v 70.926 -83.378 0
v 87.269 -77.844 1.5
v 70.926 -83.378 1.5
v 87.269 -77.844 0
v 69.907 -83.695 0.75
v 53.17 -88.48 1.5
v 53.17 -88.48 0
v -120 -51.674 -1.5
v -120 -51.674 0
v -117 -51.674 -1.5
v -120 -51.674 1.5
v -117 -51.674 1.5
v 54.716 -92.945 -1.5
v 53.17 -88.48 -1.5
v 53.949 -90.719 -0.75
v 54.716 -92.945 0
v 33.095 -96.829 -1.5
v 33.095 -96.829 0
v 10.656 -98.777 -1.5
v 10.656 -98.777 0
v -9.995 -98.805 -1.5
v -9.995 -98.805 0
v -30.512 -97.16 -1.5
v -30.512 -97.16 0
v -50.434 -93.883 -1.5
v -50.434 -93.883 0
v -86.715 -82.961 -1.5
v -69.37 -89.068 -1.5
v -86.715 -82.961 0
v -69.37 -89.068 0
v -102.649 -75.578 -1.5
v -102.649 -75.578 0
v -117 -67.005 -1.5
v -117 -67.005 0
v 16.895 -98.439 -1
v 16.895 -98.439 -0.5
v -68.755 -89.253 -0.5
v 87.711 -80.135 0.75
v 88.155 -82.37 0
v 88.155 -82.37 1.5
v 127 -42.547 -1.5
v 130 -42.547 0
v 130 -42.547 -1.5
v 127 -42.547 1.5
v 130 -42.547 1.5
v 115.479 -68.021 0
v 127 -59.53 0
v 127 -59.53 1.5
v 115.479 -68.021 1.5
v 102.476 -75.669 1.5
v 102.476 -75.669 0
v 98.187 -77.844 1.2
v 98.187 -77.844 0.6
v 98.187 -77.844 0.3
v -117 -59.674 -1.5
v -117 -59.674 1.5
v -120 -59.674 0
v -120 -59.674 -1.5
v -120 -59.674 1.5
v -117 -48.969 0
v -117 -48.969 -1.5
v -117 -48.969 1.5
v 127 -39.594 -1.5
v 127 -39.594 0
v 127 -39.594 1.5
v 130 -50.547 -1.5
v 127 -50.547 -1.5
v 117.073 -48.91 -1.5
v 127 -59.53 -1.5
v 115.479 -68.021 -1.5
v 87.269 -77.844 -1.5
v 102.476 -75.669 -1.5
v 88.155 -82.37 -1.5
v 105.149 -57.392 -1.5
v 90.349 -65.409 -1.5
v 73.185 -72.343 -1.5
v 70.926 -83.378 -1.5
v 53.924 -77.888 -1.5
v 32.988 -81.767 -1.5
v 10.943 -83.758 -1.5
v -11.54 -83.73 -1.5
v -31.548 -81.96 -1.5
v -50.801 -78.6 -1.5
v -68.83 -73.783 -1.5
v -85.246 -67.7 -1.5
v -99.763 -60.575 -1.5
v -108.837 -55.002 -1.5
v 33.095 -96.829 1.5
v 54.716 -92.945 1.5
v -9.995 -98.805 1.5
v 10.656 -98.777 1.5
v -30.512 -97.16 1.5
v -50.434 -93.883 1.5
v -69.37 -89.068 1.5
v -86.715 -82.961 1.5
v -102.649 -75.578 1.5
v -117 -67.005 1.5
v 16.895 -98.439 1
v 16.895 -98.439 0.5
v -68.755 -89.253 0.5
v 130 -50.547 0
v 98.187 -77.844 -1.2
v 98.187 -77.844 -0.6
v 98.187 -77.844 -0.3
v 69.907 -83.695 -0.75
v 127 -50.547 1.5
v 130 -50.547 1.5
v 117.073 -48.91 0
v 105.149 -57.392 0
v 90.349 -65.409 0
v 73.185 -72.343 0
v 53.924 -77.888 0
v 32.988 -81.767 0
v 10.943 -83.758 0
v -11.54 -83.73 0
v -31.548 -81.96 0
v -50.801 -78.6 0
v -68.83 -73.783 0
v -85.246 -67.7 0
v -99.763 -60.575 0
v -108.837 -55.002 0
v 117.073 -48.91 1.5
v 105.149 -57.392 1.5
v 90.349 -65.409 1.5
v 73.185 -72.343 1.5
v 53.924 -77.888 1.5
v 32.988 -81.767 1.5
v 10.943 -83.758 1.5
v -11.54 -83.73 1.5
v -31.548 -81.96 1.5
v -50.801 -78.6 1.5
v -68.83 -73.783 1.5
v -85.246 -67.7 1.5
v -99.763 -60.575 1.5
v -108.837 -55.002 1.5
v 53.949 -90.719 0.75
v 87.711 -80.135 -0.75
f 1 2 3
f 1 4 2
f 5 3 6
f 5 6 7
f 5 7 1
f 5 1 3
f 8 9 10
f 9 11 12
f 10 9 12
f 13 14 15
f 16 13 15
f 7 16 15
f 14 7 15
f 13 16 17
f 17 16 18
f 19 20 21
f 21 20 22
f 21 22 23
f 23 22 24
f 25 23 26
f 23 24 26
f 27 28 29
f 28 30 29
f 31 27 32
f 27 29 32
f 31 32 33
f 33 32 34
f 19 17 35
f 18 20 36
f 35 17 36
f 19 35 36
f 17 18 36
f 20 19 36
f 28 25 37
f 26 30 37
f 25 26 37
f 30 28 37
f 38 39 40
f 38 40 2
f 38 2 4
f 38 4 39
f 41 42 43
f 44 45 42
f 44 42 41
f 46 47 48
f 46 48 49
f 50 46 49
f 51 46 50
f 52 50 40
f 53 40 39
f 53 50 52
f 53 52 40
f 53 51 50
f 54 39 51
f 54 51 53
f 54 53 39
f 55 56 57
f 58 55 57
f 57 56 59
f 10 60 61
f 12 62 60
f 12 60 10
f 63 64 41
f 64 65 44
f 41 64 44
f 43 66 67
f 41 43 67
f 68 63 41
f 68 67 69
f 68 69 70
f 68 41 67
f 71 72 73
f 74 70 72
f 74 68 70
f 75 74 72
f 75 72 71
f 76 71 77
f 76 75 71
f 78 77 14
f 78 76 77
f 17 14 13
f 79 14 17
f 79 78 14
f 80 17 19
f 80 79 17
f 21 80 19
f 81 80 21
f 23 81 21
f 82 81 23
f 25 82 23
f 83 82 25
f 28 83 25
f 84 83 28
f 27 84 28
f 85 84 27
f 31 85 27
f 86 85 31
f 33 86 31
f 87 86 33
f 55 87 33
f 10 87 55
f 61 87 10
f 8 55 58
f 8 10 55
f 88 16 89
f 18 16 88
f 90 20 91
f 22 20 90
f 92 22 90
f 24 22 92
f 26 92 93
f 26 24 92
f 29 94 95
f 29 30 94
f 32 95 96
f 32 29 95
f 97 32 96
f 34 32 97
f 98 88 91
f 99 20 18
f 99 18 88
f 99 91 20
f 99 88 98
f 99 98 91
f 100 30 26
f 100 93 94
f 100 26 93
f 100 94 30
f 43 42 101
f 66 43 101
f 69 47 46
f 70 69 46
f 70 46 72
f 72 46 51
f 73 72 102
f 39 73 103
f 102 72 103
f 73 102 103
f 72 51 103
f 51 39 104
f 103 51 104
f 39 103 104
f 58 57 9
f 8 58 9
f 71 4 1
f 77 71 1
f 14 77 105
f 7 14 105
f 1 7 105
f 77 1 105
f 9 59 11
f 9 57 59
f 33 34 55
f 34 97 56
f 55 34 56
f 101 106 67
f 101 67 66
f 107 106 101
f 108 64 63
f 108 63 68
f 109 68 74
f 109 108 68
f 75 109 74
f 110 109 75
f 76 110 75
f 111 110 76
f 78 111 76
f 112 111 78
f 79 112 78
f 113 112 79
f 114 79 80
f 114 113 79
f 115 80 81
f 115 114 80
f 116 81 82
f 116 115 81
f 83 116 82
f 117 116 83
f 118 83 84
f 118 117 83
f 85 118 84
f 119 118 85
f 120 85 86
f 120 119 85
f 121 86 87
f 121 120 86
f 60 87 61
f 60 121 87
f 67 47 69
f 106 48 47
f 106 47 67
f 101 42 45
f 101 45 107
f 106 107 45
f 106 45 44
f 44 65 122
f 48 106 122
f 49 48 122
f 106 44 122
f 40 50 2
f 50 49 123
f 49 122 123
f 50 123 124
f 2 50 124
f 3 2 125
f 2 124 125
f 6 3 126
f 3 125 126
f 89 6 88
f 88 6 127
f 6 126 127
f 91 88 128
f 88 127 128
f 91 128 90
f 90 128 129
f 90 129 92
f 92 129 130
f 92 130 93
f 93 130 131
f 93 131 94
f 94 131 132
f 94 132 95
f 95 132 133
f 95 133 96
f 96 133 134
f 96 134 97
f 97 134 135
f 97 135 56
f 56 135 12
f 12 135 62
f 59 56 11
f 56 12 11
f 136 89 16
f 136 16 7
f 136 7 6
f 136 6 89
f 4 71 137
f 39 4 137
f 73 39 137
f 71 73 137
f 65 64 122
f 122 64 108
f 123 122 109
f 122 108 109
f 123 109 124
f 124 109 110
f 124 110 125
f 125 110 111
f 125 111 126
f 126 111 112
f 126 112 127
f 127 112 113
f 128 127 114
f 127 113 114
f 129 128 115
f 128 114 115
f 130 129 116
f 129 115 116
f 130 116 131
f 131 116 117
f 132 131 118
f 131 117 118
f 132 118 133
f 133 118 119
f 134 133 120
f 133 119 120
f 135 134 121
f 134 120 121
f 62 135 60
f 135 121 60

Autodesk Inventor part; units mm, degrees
ref_plane "YZ Plane" through (0, 0, 0) normal (1, 0, 0) x (0, 1, 0)
ref_plane "XZ Plane" through (0, 0, 0) normal (0, 1, 0) x (-1, 0, 0)
ref_plane "XY Plane" through (0, 0, 0) normal (0, 0, 1) x (1, 0, 0)
ref_plane "Work Plane1" through (0, 0, 0) normal (0, 0, -1) x (-1, 0, 0)
sketch "Sketch1" plane through (0, 0, 0) normal (0, 0, -1) x (-1, 0, 0)
  spline S0 degree 3 poles (105.4883, 71.0587) (105.6559, 71.4694) (105.824, 71.88) (106.1569, 72.6904) (106.3216, 73.0904) (106.4867, 73.4901) knots -0.266162 -0.266162 -0.266162 -0.266162 -0.133087 -0.133087 -0.003341 -0.003341 -0.003341 -0.003341
  spline S1 degree 3 poles (106.4867, 73.4901) (99.3414, 77.5054) (91.623, 81.1106) (83.426, 84.2596) knots -25.895552 -25.895552 -25.895552 -25.895552 -23.89596 -23.89596 -23.89596 -23.89596
  spline S2 degree 3 poles (83.426, 84.2596) (83.383, 84.1862) (83.3401, 84.1127) (83.2498, 83.9584) (83.2025, 83.8776) (83.1552, 83.7967) knots -0.053633 -0.053633 -0.053633 -0.053633 -0.028107 -0.028107 0 0 0 0
  spline S3 degree 3 poles (83.1552, 83.7967) (82.995, 83.5034) (82.8346, 83.2101) (82.5137, 82.6238) (82.353, 82.3306) (82.1922, 82.0376) knots -0.200537 -0.200537 -0.200537 -0.200537 -0.100278 -0.100278 -0.000001 -0.000001 -0.000001 -0.000001
  spline S4 degree 3 poles (82.1922, 82.0376) (86.075, 80.3865) (89.9435, 78.6654) (97.7089, 75.0245) (101.6317, 73.0864) (105.4883, 71.0587) knots -2.573015 -2.573015 -2.573015 -2.573015 -1.307167 -1.307167 -0.00005 -0.00005 -0.00005 -0.00005
  spline S5 degree 3 poles (-58.9228, -91.9417) (-58.7749, -91.5277) (-58.6267, -91.1139) (-58.3286, -90.2835) (-58.1787, -89.8669) (-58.0284, -89.4505) knots -0.264733 -0.264733 -0.264733 -0.264733 -0.132868 -0.132868 -0.000055 -0.000055 -0.000055 -0.000055
  spline S6 degree 3 poles (-58.0284, -89.4505) (-62.2238, -88.2949) (-66.4105, -87.0769) (-74.8294, -84.4769) (-79.0836, -83.0842) (-83.2953, -81.6123) knots -2.643421 -2.643421 -2.643421 -2.643421 -1.338468 -1.338468 -0.000018 -0.000018 -0.000018 -0.000018
  spline S7 degree 3 poles (-83.2953, -81.6123) (-83.3681, -81.9392) (-83.4412, -82.2661) (-83.5877, -82.9196) (-83.6612, -83.2462) (-83.7349, -83.5728) knots -0.200918 -0.200918 -0.200918 -0.200918 -0.100445 -0.100445 0 0 0 0
  spline S8 degree 3 poles (-83.7349, -83.5728) (-83.7526, -83.6651) (-83.7703, -83.7574) (-83.8042, -83.9335) (-83.8204, -84.0175) (-83.8365, -84.1014) knots -0.056363 -0.056363 -0.056363 -0.056363 -0.02818 -0.02818 -0.002542 -0.002542 -0.002542 -0.002542
  spline S9 degree 3 poles (-83.8365, -84.1014) (-75.9007, -87.1708) (-67.5641, -89.7922) (-58.9228, -91.9417) knots -18.70759 -18.70759 -18.70759 -18.70759 -16.308401 -16.308401 -16.308401 -16.308401
  spline S10 degree 3 poles (-140.1561, 42.7052) (-140.5265, 42.9467) (-140.897, 43.1882) (-141.6163, 43.6575) (-141.9653, 43.8854) (-142.3142, 44.1132) knots -0.265285 -0.265285 -0.265285 -0.265285 -0.132646 -0.132646 -0.007633 -0.007633 -0.007633 -0.007633
  spline S11 degree 3 poles (-142.3142, 44.1132) (-146.1137, 39.3661) (-149.4383, 34.2577) (-152.1041, 28.8109) knots -4.827939 -4.827939 -4.827939 -4.827939 -3.006582 -3.006582 -3.006582 -3.006582
  spline S12 degree 3 poles (-152.1041, 28.8109) (-152.0643, 28.7818) (-152.0246, 28.7528) (-151.9093, 28.6685) (-151.8337, 28.6133) (-151.7582, 28.5581) knots -0.042842 -0.042842 -0.042842 -0.042842 -0.028073 -0.028073 -0.000004 -0.000004 -0.000004 -0.000004
  spline S13 degree 3 poles (-151.7582, 28.5581) (-151.4839, 28.3673) (-151.2096, 28.1764) (-150.6612, 27.7945) (-150.3869, 27.6033) (-150.1128, 27.4122) knots -0.200499 -0.200499 -0.200499 -0.200499 -0.100262 -0.100262 -0.000004 -0.000004 -0.000004 -0.000004
  spline S14 degree 3 poles (-150.1128, 27.4122) (-148.5536, 30.1288) (-146.8737, 32.8286) (-143.5422, 37.8978) (-141.8646, 40.3248) (-140.1561, 42.7052) knots -1.819993 -1.819993 -1.819993 -1.819993 -0.879034 -0.879034 -0.00001 -0.00001 -0.00001 -0.00001
  spline S15 degree 3 poles (-55.7728, -89.0282) (-55.9385, -89.4734) (-56.1038, -89.9189) (-56.4333, -90.8099) (-56.5976, -91.2556) (-56.7614, -91.7014) knots -0.285003 -0.285003 -0.285003 -0.285003 -0.142483 -0.142483 0 0 0 0
  spline S16 degree 3 poles (-56.7614, -91.7014) (-56.6983, -91.718) (-56.6352, -91.7345) (-56.509, -91.7676) (-56.4459, -91.7842) (-56.3828, -91.8007) knots -0.039143 -0.039143 -0.039143 -0.039143 -0.019569 -0.019569 0 0 0 0
  spline S17 degree 3 poles (-56.3828, -91.8007) (-56.222, -91.32) (-56.0607, -90.8394) (-55.7373, -89.8786) (-55.5752, -89.3983) (-55.4125, -88.9181) knots -0.30413 -0.30413 -0.30413 -0.30413 -0.152078 -0.152078 0 0 0 0
  spline S18 degree 3 poles (-55.4125, -88.9181) (-60.3959, -87.5747) (-65.3718, -86.1432) (-75.3762, -83.0506) (-80.443, -81.3711) (-85.4421, -79.5755) knots -3.141533 -3.141533 -3.141533 -3.141533 -1.593545 -1.593545 0 0 0 0
  spline S19 degree 3 poles (-85.4421, -79.5755) (-85.6008, -80.3472) (-85.7615, -81.1191) (-86.0831, -82.6482) (-86.2442, -83.4064) (-86.4067, -84.1638) knots -0.472496 -0.472496 -0.472496 -0.472496 -0.236135 -0.236135 -0.003733 -0.003733 -0.003733 -0.003733
  spline S20 degree 3 poles (-86.4067, -84.1638) (-90.9201, -82.3538) (-95.299, -80.3975) (-116.0195, -70.1094) (-129.7607, -59.9705) (-146.1593, -41.4596) (-151.3501, -33.6293) (-158.2079, -17.0493) (-159.9962, -8.6553) (-160, -0.0185) (-160, -0.0092) (-160, 0) knots -11.169519 -11.169519 -11.169519 -11.169519 -9.988301 -9.988301 -5.37837 -5.37837 -2.588261 -2.588261 0 0 0.002775 0.002775 0.002775 0.002775
  spline S21 degree 3 poles (-160, 0) (-160, 0.0092) (-160, 0.0185) (-159.9962, 8.6553) (-158.2079, 17.0493) (-154.5318, 25.937) (-154.1376, 26.8372) (-153.7259, 27.7288) knots -31.829362 -31.829362 -31.829362 -31.829362 -31.826146 -31.826146 -28.826161 -28.826161 -28.484445 -28.484445 -28.484445 -28.484445
  spline S22 degree 3 poles (-153.7259, 27.7288) (-153.1336, 27.3124) (-152.5409, 26.8949) (-151.3076, 26.0243) (-150.6649, 25.5695) (-150.024, 25.1147) knots -0.452924 -0.452924 -0.452924 -0.452924 -0.235762 -0.235762 0 0 0 0
  spline S23 degree 3 poles (-150.024, 25.1147) (-148.2187, 28.3868) (-146.2111, 31.6512) (-142.2626, 37.6605) (-140.2732, 40.5119) (-138.2471, 43.2948) knots -2.156978 -2.156978 -2.156978 -2.156978 -1.032693 -1.032693 0 0 0 0
  spline S24 degree 3 poles (-138.2471, 43.2948) (-138.666, 43.5795) (-139.085, 43.8644) (-139.9224, 44.4342) (-140.3412, 44.7193) (-140.7597, 45.0044) knots -0.303868 -0.303868 -0.303868 -0.303868 -0.151928 -0.151928 0 0 0 0
  spline S25 degree 3 poles (-140.7597, 45.0044) (-140.7862, 44.9688) (-140.8126, 44.9333) (-140.8655, 44.8622) (-140.8919, 44.8266) (-140.9183, 44.7911) knots -0.026582 -0.026582 -0.026582 -0.026582 -0.013294 -0.013294 0 0 0 0
  spline S26 degree 3 poles (-140.9183, 44.7911) (-140.5212, 44.5325) (-140.1238, 44.2739) (-139.3291, 43.7572) (-138.9316, 43.4988) (-138.5341, 43.2407) knots -0.284373 -0.284373 -0.284373 -0.284373 -0.142194 -0.142194 0 0 0 0
  spline S27 degree 3 poles (-138.5341, 43.2407) (-140.5827, 40.4214) (-142.5937, 37.5316) (-146.4382, 31.6576) (-148.3257, 28.5856) (-150.0388, 25.5027) knots -2.101071 -2.101071 -2.101071 -2.101071 -1.058051 -1.058051 0 0 0 0
  spline S28 degree 3 poles (-150.0388, 25.5027) (-150.4509, 25.7942) (-150.8636, 26.0856) (-151.6884, 26.6672) (-152.1012, 26.9578) (-152.5139, 27.2479) knots -0.302777 -0.302777 -0.302777 -0.302777 -0.151341 -0.151341 0 0 0 0
  spline S29 degree 3 poles (-152.5139, 27.2479) (-152.7152, 27.3968) (-152.9166, 27.5456) (-153.2728, 27.8086) (-153.4277, 27.9229) (-153.5827, 28.0371) knots -0.150173 -0.150173 -0.150173 -0.150173 -0.075073 -0.075073 -0.017326 -0.017326 -0.017326 -0.017326
  spline S30 degree 3 poles (-153.5827, 28.0371) (-150.1123, 35.463) (-145.4306, 42.2822) (-129.7607, 59.9705) (-116.0195, 70.1094) (-76.1689, 89.896) (-48.1593, 97.1685) (10.3236, 101.4292) (40.3067, 98.6374) (72.6866, 89.1455) (77.3003, 87.6154) (81.772, 85.9536) knots -28.445006 -28.445006 -28.445006 -28.445006 -25.59222 -25.59222 -20.248971 -20.248971 -12.682668 -12.682668 -5.317025 -5.317025 -4.052572 -4.052572 -4.052572 -4.052572
  spline S31 degree 3 poles (81.772, 85.9536) (81.3968, 85.2772) (81.0207, 84.6011) (80.261, 83.24) (79.8771, 82.5546) (79.4924, 81.87) knots -0.467618 -0.467618 -0.467618 -0.467618 -0.235584 -0.235584 0 0 0 0
  spline S32 degree 3 poles (79.4924, 81.87) (84.1061, 79.9441) (88.7048, 77.9202) (97.927, 73.5976) (102.5965, 71.2674) (107.162, 68.806) knots -3.056553 -3.056553 -3.056553 -3.056553 -1.556035 -1.556035 0 0 0 0
  spline S33 degree 3 poles (107.162, 68.806) (107.3625, 69.2729) (107.5637, 69.7398) (107.967, 70.6725) (108.1693, 71.1387) (108.372, 71.6045) knots -0.304859 -0.304859 -0.304859 -0.304859 -0.152403 -0.152403 0 0 0 0
  spline S34 degree 3 poles (108.372, 71.6045) (108.3114, 71.6376) (108.2508, 71.6707) (108.1296, 71.7369) (108.069, 71.7699) (108.0084, 71.8029) knots -0.041431 -0.041431 -0.041431 -0.041431 -0.020705 -0.020705 0 0 0 0
  spline S35 degree 3 poles (108.0084, 71.8029) (107.8317, 71.3605) (107.6555, 70.9178) (107.3043, 70.0319) (107.1293, 69.5884) (106.9549, 69.1449) knots -0.285892 -0.285892 -0.285892 -0.285892 -0.142982 -0.142982 0 0 0 0
  spline S36 degree 3 poles (106.9549, 69.1449) (102.4581, 71.5609) (97.862, 73.8503) (88.8578, 78.0679) (84.4081, 80.0293) (79.9435, 81.8987) knots -2.982662 -2.982662 -2.982662 -2.982662 -1.452066 -1.452066 0 0 0 0
  spline S37 degree 3 poles (79.9435, 81.8987) (80.1899, 82.3388) (80.4359, 82.7793) (80.9269, 83.6602) (81.172, 84.1009) (81.4166, 84.5417) knots -0.302566 -0.302566 -0.302566 -0.302566 -0.151255 -0.151255 0 0 0 0
  spline S38 degree 3 poles (81.4166, 84.5417) (81.5446, 84.757) (81.6725, 84.9724) (81.9225, 85.3939) (82.0446, 85.6002) (82.1667, 85.8065) knots -0.150242 -0.150242 -0.150242 -0.150242 -0.075112 -0.075112 -0.003204 -0.003204 -0.003204 -0.003204
  spline S39 degree 3 poles (82.1667, 85.8065) (96.3401, 80.5048) (109.0798, 73.8828) (120, 66.1438) knots -4.015333 -4.015333 -4.015333 -4.015333 0 0 0 0
  line L0 (120, 66.1438) -> (120, 64.9158)
  spline S40 degree 3 poles (120, 64.9158) (116.958, 67.0958) (113.7696, 69.1883) (110.4451, 71.1884) knots -27.230162 -27.230162 -27.230162 -27.230162 -26.2705 -26.2705 -26.2705 -26.2705
  spline S41 degree 3 poles (110.4451, 71.1884) (110.1445, 70.4793) (109.8452, 69.769) (109.2415, 68.3271) (108.9366, 67.5943) (108.6339, 66.8613) knots -0.468981 -0.468981 -0.468981 -0.468981 -0.237923 -0.237923 -0.000011 -0.000011 -0.000011 -0.000011
  spline S42 degree 3 poles (108.6339, 66.8613) (103.4133, 69.7415) (98.0406, 72.4439) (87.5696, 77.3439) (82.4064, 79.5941) (77.2296, 81.7217) knots -3.467821 -3.467821 -3.467821 -3.467821 -1.679111 -1.679111 -0.000008 -0.000008 -0.000008 -0.000008
  spline S43 degree 3 poles (77.2296, 81.7217) (77.6144, 82.3927) (77.9981, 83.0647) (78.7561, 84.3968) (79.1306, 85.0574) (79.504, 85.7183) knots -0.463944 -0.463944 -0.463944 -0.463944 -0.231888 -0.231888 -0.004157 -0.004157 -0.004157 -0.004157
  spline S44 degree 3 poles (79.504, 85.7183) (76.0004, 86.9793) (72.415, 88.1586) (41.4117, 97.4273) (11.7123, 100.3449) (-46.585, 96.4605) (-74.7083, 89.3312) (-114.7844, 69.7233) (-128.6069, 59.6354) (-139.3968, 47.5895) (-139.9204, 46.9907) (-140.4363, 46.3856) knots -23.579938 -23.579938 -23.579938 -23.579938 -22.740514 -22.740514 -16.469513 -16.469513 -9.96116 -9.96116 -5.360215 -5.360215 -5.122195 -5.122195 -5.122195 -5.122195
  spline S45 degree 3 poles (-140.4363, 46.3856) (-139.8213, 45.9676) (-139.2057, 45.5495) (-137.9379, 44.6893) (-137.2846, 44.2465) (-136.6316, 43.8045) knots -0.459695 -0.459695 -0.459695 -0.459695 -0.236626 -0.236626 -0.000067 -0.000067 -0.000067 -0.000067
  spline S46 degree 3 poles (-136.6316, 43.8045) (-139.0543, 40.5163) (-141.435, 37.1237) (-145.8862, 30.2958) (-148.0558, 26.7109) (-149.9507, 23.1379) knots -2.432531 -2.432531 -2.432531 -2.432531 -1.213323 -1.213323 -0.000041 -0.000041 -0.000041 -0.000041
  spline S47 degree 3 poles (-149.9507, 23.1379) (-150.5793, 23.5926) (-151.2102, 24.0472) (-152.4036, 24.904) (-152.9683, 25.3083) (-153.5328, 25.7113) knots -0.46512 -0.46512 -0.46512 -0.46512 -0.232385 -0.232385 -0.024389 -0.024389 -0.024389 -0.024389
  spline S48 degree 3 poles (-153.5328, 25.7113) (-153.6538, 25.4318) (-153.773, 25.1514) (-157.1991, 16.9475) (-158.9961, 8.6066) (-159, 0.0184) (-159, 0.0092) (-159, 0) knots -2.665061 -2.665061 -2.665061 -2.665061 -2.573705 -2.573705 0 0 0.002756 0.002756 0.002756 0.002756
  spline S49 degree 3 poles (-159, 0) (-159, -0.0092) (-159, -0.0184) (-158.9961, -8.6066) (-157.1991, -16.9475) (-150.3081, -33.4479) (-145.0794, -41.2454) (-128.6069, -59.6354) (-114.7844, -69.7233) (-94.9296, -79.4376) (-91.5828, -80.947) (-88.1549, -82.3704) knots -31.860137 -31.860137 -31.860137 -31.860137 -31.856914 -31.856914 -28.845903 -28.845903 -25.585929 -25.585929 -20.203225 -20.203225 -19.146895 -19.146895 -19.146895 -19.146895
  spline S50 degree 3 poles (-88.1549, -82.3704) (-88.0052, -81.6256) (-87.8572, -80.88) (-87.5617, -79.3716) (-87.4141, -78.6078) (-87.2687, -77.844) knots -0.461141 -0.461141 -0.461141 -0.461141 -0.233241 -0.233241 -0.000001 -0.000001 -0.000001 -0.000001
  spline S51 degree 3 poles (-87.2687, -77.844) (-81.5487, -79.9485) (-75.7304, -81.8959) (-64.3706, -85.4046) (-58.7727, -86.9978) (-53.1699, -88.4802) knots -3.567329 -3.567329 -3.567329 -3.567329 -1.738656 -1.738656 -0.000005 -0.000005 -0.000005 -0.000005
  spline S52 degree 3 poles (-53.1699, -88.4802) (-53.431, -89.2258) (-53.6908, -89.9722) (-54.2061, -91.4603) (-54.4617, -92.2027) (-54.7161, -92.9452) knots -0.473894 -0.473894 -0.473894 -0.473894 -0.236906 -0.236906 -0.001451 -0.001451 -0.001451 -0.001451
  spline S53 degree 3 poles (-54.7161, -92.9452) (-42.581, -95.7181) (-29.8883, -97.573) (11.7123, -100.3449) (41.4117, -97.4273) (88.331, -83.4004) (105.7686, -75.1143) (120, -64.9158) knots -15.921251 -15.921251 -15.921251 -15.921251 -12.589021 -12.589021 -5.252496 -5.252496 0 0 0 0
  line L1 (120, -64.9158) -> (120, -66.1438)
  spline S54 degree 3 poles (120, -66.1438) (105.5396, -76.3916) (87.8918, -84.6882) (40.3067, -98.6374) (10.3236, -101.4292) (-42.6253, -97.5717) (-65.6494, -92.43) (-85.9727, -84.3372) knots -27.458265 -27.458265 -27.458265 -27.458265 -22.870958 -22.870958 -16.51619 -16.51619 -11.207345 -11.207345 -11.207345 -11.207345
  spline S55 degree 3 poles (-85.9727, -84.3372) (-85.9295, -84.1013) (-85.8864, -83.8654) (-85.7984, -83.3821) (-85.7536, -83.1347) (-85.709, -82.8873) knots -0.147372 -0.147372 -0.147372 -0.147372 -0.075421 -0.075421 0 0 0 0
  spline S56 degree 3 poles (-85.709, -82.8873) (-85.6031, -82.3929) (-85.4977, -81.8982) (-85.2884, -80.9085) (-85.1844, -80.4132) (-85.081, -79.918) knots -0.303476 -0.303476 -0.303476 -0.303476 -0.151784 -0.151784 0 0 0 0
  spline S57 degree 3 poles (-85.081, -79.918) (-80.1681, -81.6744) (-75.1908, -83.3195) (-65.4257, -86.3336) (-60.6031, -87.7222) (-55.7728, -89.0282) knots -3.066818 -3.066818 -3.066818 -3.066818 -1.501137 -1.501137 0 0 0 0
  line L2 (-130, 140) -> (-130, -140)
  ellipse E0 centre (0, 0) end of major axis (0, -84.0004) minor radius 144 (-130, -36.1292) -> (120, -46.4329) ccw
  line L3 (120, -64.9158) -> (120, -46.4329)
  point P0 (-144, 0)
  point P1 (0.0014, -84.0004)
  point P2 (0.0014, -99.0004)
  point P3 (-130, -56.9656)
  dimension "d0" = 15
  dimension "d1" = 15
extrude "Extrusion1" add sketch "Sketch1" along normal mid plane 3 contours S53 S52 S51 S50 S49 L2 E0 L3
sketch "Sketch2" plane through (0, 0, 1.5) normal (0, 0, 1) x (1, 0, 0)
  line L0 (-117, -59.6744) -> (-120, -59.6744)
  line L1 (-120, -59.6744) -> (-120, -51.6744)
  line L2 (-120, -51.6744) -> (-117, -51.6744)
  line L3 (-117, -51.6744) -> (-117, -59.6744)
  line L4 (-120, -46.4329) -> (-120, -64.9158) projected
  line L5 (-117, -71.407) -> (-128.5796, -71.407)
  line L6 (-117, -59.6744) -> (-120, -59.6744)
  line L7 (-120, -59.6744) -> (-120, -69.599)
  line L8 (-120, -69.599) -> (-117, -69.599)
  line L9 (-117, -69.599) -> (-117, -59.6744)
  line L10 (-117, -51.6744) -> (-120, -51.6744)
  line L11 (-120, -51.6744) -> (-120, -38.1528)
  line L12 (-120, -38.1528) -> (-117, -38.1528)
  line L13 (-117, -38.1528) -> (-117, -51.6744)
  point P0 (0, 0)
  point P1 (-120, -55.6744)
  point P2 (-120, -51.6744)
  point P3 (-120, -59.6744)
  dimension "d4" = 3
  dimension "d5" = 8
extrude "Extrusion2" cut sketch "Sketch2" against normal blind 3 contours L9 L8 L7 L4 L0 | L2 L4 L11 L12 L13
sketch "Sketch3" plane through (0, 0, 1.5) normal (0, 0, 1) x (1, 0, 0)
  line L0 (130, -42.5474) -> (127, -42.5474)
  line L1 (127, -42.5474) -> (127, -50.5474)
  line L2 (127, -50.5474) -> (130, -50.5474)
  line L3 (130, -50.5474) -> (130, -42.5474)
  line L4 (130, -56.9656) -> (130, -36.1292) projected
  line L5 (127, -50.5474) -> (130, -50.5474)
  line L6 (130, -50.5474) -> (130, -68.4887)
  line L7 (130, -68.4887) -> (127, -68.4887)
  line L8 (127, -68.4887) -> (127, -50.5474)
  line L9 (127, -42.5474) -> (130, -42.5474)
  line L10 (130, -42.5474) -> (130, -28.3653)
  line L11 (130, -28.3653) -> (127, -28.3653)
  line L12 (127, -28.3653) -> (127, -42.5474)
  point P0 (0, 0)
  point P1 (130, -46.5474)
  dimension "d8" = 8
  dimension "d9" = 3
extrude "Extrusion3" cut sketch "Sketch3" against normal blind 3 contours L0 L12 L11 L10 L4 | L4 L6 L7 L8 L2
properties part number "Spant"
